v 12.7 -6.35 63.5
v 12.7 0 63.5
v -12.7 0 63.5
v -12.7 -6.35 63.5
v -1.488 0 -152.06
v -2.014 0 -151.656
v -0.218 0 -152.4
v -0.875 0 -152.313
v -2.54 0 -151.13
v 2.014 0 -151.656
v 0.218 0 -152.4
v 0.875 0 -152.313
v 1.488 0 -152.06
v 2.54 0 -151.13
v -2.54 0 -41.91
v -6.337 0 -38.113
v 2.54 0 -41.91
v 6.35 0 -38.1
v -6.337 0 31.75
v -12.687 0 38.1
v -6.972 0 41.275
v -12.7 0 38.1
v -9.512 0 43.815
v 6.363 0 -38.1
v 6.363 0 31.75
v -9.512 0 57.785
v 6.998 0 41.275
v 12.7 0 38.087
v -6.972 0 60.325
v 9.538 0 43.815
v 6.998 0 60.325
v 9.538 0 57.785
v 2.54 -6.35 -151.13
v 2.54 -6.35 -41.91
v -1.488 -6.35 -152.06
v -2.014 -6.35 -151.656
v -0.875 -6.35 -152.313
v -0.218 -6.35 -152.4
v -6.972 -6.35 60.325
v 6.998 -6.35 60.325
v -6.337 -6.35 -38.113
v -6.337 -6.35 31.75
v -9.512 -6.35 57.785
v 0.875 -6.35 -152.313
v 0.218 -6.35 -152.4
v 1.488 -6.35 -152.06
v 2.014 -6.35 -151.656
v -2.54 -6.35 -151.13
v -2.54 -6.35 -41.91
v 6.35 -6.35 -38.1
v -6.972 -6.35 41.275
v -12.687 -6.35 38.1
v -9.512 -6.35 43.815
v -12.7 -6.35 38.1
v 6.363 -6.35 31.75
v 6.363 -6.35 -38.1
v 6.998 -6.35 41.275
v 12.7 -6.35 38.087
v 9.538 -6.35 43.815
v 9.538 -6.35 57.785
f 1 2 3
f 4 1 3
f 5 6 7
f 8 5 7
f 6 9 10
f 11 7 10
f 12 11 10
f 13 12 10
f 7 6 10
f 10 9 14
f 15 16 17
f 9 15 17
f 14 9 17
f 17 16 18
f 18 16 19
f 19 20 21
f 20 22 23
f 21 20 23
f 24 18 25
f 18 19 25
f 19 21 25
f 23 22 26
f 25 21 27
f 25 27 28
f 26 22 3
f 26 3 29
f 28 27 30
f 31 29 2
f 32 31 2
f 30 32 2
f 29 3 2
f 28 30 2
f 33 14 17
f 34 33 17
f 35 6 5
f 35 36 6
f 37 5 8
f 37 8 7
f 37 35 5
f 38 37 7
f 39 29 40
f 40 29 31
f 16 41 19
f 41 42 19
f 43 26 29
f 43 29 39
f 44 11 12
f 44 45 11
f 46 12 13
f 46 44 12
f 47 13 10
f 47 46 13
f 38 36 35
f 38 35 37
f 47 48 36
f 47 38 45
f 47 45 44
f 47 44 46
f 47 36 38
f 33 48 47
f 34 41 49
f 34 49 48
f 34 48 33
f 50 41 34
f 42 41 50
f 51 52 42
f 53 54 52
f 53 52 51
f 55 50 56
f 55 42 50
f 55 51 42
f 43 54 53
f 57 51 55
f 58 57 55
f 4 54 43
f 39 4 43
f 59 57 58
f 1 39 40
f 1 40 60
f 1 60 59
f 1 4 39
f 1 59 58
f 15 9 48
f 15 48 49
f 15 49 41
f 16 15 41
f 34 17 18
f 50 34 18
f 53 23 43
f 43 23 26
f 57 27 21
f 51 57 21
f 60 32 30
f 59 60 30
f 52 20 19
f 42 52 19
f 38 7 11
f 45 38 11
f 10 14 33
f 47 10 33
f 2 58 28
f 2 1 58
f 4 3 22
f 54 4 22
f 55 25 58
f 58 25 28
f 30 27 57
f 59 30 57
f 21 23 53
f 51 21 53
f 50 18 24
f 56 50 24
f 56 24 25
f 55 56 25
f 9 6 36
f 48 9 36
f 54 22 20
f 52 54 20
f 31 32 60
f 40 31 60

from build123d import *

# Parameters (mm, degrees)
F0_W        = 5.08
F0_H        = 114.3
F1_DEPTH    = 6.35
F2_SIZE     = 1.27
F3_R        = 2.54
F4_T1_DEPTH = 6.35
F4_T6_DEPTH = 6.35
F5_SIZE     = 2.54
F6_T1_DEPTH = 6.35
F6_T6_DEPTH = 6.35


# Not quite as in the source:
# - a fillet or chamfer that OpenCascade refuses, or shapes differently, is made with other operations: its cross-section is extruded or revolved along the edge and cut away or added


with BuildPart() as f1:
    # F0 (on Front) → F1 (new body)
    with BuildSketch(Plane.XZ):
        Polygon((12.7, 38.1), (12.7, 63.5), (-12.7, 63.5), (-12.7, 38.1), (-6.3373190351, 38.1), (-6.3373190351, -38.1), (-2.54, -38.1), (2.54, -38.1), (6.3626809649, -38.1), (6.3626809649, 38.1), align=None)
        Polygon((-9.5123190351, 60.325), (9.5376809649, 60.325), (9.5376809649, 41.275), (6.3626809649, 41.275), (-6.3373190351, 41.275), (-9.5123190351, 41.275), align=None, mode=Mode.SUBTRACT)
        with Locations((0, -95.25)):
            Rectangle(F0_W, F0_H)
    extrude(amount=F1_DEPTH)

    # F2
    f2_edges = [f1.edges().sort_by_distance(p)[0] for p in [
        (-2.54, -3.175, -152.4),
        (2.54, -3.175, -152.4),
    ]]
    chamfer(f2_edges, length=F2_SIZE)

    # F3
    f3_edges = [f1.edges().sort_by_distance(p)[0] for p in [
        (-1.27, -3.175, -152.4),
        (1.27, -3.175, -152.4),
    ]]
    fillet(f3_edges, radius=F3_R)

    # F4: chamfer of 3.81 on 2 edges, made by hand

    # F4_s2 → F4_t1 (join)
    with BuildSketch(Plane.XZ):
        Polygon((2.54, -41.91), (6.35, -38.1), (2.54, -38.1), align=None)
    extrude(amount=F4_T1_DEPTH)


with BuildPart() as f4_tool4:
    # F4_s5 → F4_t6 (new body)
    with BuildSketch(Plane.XZ):
        Polygon((-2.54, -41.91), (-6.35, -38.1), (-2.54, -38.1), align=None)
    extrude(amount=F4_T6_DEPTH)

    split(bisect_by=Plane.YZ.offset(-6.3373190351), keep=Keep.TOP)


with BuildPart() as f1_1:
    add(f1.part)

    # F4_t3: union F4_tool4
    add(f4_tool4.part)

    # F5
    f5_edges = [f1_1.edges().sort_by_distance(p)[0] for p in [
        (-9.512319, -3.175, 60.325),
        (9.537681, -3.175, 60.325),
        (-9.512319, -3.175, 41.275),
        (9.537681, -3.175, 41.275),
    ]]
    chamfer(f5_edges, length=F5_SIZE)

    # F6: chamfer of 6.35 on 2 edges, made by hand

    # F6_s2 → F6_t1 (join)
    with BuildSketch(Plane.XZ):
        Polygon((-12.6873190351, 38.1), (-6.3373190351, 31.75), (-6.3373190351, 38.1), align=None)
    extrude(amount=F6_T1_DEPTH)


with BuildPart() as f6_tool4:
    # F6_s5 → F6_t6 (new body)
    with BuildSketch(Plane.XZ):
        Polygon((6.3626809649, 31.75), (12.7126809649, 38.1), (6.3626809649, 38.1), align=None)
    extrude(amount=F6_T6_DEPTH)

    split(bisect_by=Plane.YZ.offset(12.7), keep=Keep.BOTTOM)


with BuildPart() as f1_2:
    add(f1_1.part)

    # F6_t3: union F6_tool4
    add(f6_tool4.part)


solid = f1_2.part
